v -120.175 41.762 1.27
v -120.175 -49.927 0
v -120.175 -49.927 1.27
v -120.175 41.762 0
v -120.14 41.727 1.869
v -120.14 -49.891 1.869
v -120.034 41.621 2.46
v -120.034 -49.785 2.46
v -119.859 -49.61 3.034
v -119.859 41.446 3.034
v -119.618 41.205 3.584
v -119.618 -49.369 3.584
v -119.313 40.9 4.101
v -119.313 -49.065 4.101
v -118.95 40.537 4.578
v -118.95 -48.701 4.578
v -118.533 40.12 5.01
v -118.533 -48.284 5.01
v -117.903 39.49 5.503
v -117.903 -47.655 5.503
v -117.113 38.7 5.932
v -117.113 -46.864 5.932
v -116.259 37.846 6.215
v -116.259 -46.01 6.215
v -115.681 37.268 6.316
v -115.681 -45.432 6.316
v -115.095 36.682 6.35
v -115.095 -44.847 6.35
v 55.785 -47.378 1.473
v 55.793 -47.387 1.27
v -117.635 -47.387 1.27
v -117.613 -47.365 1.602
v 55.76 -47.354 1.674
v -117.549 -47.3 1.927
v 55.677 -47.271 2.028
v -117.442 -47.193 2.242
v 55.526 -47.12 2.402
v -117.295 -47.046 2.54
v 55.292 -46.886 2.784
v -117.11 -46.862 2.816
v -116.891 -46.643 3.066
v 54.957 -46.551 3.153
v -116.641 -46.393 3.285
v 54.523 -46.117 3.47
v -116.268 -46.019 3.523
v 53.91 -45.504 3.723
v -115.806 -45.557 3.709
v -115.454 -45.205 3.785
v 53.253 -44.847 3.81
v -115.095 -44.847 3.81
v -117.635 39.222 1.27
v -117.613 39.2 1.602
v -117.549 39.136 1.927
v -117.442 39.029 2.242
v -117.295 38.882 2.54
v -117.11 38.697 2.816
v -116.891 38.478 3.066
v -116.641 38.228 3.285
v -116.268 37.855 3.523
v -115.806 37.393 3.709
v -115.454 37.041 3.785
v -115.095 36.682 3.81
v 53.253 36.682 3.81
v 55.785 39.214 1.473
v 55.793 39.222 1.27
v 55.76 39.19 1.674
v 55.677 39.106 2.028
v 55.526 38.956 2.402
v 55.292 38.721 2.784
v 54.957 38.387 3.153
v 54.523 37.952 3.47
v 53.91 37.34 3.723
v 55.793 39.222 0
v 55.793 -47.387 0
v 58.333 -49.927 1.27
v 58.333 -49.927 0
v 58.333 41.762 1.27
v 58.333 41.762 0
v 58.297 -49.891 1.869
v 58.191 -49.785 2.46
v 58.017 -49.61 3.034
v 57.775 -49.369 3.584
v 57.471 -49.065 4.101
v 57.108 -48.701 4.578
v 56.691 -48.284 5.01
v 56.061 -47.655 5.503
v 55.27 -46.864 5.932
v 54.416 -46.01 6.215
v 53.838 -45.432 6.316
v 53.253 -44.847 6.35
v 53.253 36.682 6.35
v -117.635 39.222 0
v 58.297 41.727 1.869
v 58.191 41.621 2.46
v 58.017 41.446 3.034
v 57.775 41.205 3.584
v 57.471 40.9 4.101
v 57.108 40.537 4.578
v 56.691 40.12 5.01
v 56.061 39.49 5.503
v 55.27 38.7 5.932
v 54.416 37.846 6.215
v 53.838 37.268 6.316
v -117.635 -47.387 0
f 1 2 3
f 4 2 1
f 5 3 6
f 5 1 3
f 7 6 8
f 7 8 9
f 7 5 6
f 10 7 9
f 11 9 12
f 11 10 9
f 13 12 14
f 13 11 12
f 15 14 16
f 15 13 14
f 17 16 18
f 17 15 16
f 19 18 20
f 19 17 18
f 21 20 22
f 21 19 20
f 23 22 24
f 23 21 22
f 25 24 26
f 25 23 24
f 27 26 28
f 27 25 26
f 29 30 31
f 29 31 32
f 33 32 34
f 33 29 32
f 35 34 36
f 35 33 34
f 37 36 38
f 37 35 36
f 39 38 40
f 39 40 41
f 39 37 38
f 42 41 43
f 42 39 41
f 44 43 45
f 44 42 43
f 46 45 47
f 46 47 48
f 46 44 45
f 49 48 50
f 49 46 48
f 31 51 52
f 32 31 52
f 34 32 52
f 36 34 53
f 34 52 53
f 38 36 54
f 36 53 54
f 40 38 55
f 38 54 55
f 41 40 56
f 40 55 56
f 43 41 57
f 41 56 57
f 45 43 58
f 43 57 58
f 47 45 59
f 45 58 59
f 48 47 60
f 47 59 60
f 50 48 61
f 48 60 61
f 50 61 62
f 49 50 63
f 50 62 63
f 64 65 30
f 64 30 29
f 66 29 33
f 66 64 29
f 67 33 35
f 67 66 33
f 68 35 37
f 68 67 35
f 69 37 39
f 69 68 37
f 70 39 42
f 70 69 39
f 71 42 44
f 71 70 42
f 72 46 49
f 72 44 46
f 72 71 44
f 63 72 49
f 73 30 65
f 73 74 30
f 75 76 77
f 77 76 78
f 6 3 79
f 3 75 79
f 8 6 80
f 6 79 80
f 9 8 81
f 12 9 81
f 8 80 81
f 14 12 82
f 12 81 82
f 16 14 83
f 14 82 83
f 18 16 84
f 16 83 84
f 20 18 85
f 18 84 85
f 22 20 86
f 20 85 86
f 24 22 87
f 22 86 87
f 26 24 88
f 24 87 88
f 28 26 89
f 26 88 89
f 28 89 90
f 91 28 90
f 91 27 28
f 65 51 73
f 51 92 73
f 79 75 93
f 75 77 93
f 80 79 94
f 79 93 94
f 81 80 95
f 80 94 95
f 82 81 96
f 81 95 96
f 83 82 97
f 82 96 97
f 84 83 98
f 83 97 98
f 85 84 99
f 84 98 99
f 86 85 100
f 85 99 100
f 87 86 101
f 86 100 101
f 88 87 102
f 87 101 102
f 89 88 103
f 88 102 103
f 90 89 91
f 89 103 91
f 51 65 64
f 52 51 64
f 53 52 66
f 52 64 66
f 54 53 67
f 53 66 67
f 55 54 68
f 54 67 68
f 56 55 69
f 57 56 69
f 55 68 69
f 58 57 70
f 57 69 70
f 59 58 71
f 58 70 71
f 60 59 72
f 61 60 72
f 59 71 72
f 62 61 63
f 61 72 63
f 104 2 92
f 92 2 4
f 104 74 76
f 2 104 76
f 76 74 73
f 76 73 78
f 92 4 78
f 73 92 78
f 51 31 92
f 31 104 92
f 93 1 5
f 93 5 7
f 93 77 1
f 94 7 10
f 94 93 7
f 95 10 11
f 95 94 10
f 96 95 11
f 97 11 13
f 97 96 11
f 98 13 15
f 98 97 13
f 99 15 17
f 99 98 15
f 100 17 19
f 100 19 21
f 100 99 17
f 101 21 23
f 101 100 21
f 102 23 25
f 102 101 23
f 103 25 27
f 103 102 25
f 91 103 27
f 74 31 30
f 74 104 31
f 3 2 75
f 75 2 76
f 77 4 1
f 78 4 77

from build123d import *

# Parameters (mm, degrees)
F0_W     = 178.507768
F0_H     = 91.6887
F1_DEPTH = 6.35
F2_R     = 5.08
F3_T     = -2.54


with BuildPart() as f1:
    # F0 (on Top) → F1 (new body)
    with BuildSketch(Plane.XY):
        with Locations((-30.921195, -4.082151)):
            Rectangle(F0_W, F0_H)
    extrude(amount=F1_DEPTH)

    # F2
    f2_edges = [f1.edges().sort_by_distance(p)[0] for p in [
        (-30.921195, -49.926501, 6.35),
        (-30.921195, 41.762199, 6.35),
        (-120.175079, -4.082151, 6.35),
        (58.332689, -4.082151, 6.35),
    ]]
    fillet(f2_edges, radius=F2_R)

    # F3
    f3_openings = [f1.faces().sort_by_distance(p)[0] for p in [
        (-30.921195, -4.082151, 0),
    ]]
    offset(amount=F3_T, openings=f3_openings)


solid = f1.part
